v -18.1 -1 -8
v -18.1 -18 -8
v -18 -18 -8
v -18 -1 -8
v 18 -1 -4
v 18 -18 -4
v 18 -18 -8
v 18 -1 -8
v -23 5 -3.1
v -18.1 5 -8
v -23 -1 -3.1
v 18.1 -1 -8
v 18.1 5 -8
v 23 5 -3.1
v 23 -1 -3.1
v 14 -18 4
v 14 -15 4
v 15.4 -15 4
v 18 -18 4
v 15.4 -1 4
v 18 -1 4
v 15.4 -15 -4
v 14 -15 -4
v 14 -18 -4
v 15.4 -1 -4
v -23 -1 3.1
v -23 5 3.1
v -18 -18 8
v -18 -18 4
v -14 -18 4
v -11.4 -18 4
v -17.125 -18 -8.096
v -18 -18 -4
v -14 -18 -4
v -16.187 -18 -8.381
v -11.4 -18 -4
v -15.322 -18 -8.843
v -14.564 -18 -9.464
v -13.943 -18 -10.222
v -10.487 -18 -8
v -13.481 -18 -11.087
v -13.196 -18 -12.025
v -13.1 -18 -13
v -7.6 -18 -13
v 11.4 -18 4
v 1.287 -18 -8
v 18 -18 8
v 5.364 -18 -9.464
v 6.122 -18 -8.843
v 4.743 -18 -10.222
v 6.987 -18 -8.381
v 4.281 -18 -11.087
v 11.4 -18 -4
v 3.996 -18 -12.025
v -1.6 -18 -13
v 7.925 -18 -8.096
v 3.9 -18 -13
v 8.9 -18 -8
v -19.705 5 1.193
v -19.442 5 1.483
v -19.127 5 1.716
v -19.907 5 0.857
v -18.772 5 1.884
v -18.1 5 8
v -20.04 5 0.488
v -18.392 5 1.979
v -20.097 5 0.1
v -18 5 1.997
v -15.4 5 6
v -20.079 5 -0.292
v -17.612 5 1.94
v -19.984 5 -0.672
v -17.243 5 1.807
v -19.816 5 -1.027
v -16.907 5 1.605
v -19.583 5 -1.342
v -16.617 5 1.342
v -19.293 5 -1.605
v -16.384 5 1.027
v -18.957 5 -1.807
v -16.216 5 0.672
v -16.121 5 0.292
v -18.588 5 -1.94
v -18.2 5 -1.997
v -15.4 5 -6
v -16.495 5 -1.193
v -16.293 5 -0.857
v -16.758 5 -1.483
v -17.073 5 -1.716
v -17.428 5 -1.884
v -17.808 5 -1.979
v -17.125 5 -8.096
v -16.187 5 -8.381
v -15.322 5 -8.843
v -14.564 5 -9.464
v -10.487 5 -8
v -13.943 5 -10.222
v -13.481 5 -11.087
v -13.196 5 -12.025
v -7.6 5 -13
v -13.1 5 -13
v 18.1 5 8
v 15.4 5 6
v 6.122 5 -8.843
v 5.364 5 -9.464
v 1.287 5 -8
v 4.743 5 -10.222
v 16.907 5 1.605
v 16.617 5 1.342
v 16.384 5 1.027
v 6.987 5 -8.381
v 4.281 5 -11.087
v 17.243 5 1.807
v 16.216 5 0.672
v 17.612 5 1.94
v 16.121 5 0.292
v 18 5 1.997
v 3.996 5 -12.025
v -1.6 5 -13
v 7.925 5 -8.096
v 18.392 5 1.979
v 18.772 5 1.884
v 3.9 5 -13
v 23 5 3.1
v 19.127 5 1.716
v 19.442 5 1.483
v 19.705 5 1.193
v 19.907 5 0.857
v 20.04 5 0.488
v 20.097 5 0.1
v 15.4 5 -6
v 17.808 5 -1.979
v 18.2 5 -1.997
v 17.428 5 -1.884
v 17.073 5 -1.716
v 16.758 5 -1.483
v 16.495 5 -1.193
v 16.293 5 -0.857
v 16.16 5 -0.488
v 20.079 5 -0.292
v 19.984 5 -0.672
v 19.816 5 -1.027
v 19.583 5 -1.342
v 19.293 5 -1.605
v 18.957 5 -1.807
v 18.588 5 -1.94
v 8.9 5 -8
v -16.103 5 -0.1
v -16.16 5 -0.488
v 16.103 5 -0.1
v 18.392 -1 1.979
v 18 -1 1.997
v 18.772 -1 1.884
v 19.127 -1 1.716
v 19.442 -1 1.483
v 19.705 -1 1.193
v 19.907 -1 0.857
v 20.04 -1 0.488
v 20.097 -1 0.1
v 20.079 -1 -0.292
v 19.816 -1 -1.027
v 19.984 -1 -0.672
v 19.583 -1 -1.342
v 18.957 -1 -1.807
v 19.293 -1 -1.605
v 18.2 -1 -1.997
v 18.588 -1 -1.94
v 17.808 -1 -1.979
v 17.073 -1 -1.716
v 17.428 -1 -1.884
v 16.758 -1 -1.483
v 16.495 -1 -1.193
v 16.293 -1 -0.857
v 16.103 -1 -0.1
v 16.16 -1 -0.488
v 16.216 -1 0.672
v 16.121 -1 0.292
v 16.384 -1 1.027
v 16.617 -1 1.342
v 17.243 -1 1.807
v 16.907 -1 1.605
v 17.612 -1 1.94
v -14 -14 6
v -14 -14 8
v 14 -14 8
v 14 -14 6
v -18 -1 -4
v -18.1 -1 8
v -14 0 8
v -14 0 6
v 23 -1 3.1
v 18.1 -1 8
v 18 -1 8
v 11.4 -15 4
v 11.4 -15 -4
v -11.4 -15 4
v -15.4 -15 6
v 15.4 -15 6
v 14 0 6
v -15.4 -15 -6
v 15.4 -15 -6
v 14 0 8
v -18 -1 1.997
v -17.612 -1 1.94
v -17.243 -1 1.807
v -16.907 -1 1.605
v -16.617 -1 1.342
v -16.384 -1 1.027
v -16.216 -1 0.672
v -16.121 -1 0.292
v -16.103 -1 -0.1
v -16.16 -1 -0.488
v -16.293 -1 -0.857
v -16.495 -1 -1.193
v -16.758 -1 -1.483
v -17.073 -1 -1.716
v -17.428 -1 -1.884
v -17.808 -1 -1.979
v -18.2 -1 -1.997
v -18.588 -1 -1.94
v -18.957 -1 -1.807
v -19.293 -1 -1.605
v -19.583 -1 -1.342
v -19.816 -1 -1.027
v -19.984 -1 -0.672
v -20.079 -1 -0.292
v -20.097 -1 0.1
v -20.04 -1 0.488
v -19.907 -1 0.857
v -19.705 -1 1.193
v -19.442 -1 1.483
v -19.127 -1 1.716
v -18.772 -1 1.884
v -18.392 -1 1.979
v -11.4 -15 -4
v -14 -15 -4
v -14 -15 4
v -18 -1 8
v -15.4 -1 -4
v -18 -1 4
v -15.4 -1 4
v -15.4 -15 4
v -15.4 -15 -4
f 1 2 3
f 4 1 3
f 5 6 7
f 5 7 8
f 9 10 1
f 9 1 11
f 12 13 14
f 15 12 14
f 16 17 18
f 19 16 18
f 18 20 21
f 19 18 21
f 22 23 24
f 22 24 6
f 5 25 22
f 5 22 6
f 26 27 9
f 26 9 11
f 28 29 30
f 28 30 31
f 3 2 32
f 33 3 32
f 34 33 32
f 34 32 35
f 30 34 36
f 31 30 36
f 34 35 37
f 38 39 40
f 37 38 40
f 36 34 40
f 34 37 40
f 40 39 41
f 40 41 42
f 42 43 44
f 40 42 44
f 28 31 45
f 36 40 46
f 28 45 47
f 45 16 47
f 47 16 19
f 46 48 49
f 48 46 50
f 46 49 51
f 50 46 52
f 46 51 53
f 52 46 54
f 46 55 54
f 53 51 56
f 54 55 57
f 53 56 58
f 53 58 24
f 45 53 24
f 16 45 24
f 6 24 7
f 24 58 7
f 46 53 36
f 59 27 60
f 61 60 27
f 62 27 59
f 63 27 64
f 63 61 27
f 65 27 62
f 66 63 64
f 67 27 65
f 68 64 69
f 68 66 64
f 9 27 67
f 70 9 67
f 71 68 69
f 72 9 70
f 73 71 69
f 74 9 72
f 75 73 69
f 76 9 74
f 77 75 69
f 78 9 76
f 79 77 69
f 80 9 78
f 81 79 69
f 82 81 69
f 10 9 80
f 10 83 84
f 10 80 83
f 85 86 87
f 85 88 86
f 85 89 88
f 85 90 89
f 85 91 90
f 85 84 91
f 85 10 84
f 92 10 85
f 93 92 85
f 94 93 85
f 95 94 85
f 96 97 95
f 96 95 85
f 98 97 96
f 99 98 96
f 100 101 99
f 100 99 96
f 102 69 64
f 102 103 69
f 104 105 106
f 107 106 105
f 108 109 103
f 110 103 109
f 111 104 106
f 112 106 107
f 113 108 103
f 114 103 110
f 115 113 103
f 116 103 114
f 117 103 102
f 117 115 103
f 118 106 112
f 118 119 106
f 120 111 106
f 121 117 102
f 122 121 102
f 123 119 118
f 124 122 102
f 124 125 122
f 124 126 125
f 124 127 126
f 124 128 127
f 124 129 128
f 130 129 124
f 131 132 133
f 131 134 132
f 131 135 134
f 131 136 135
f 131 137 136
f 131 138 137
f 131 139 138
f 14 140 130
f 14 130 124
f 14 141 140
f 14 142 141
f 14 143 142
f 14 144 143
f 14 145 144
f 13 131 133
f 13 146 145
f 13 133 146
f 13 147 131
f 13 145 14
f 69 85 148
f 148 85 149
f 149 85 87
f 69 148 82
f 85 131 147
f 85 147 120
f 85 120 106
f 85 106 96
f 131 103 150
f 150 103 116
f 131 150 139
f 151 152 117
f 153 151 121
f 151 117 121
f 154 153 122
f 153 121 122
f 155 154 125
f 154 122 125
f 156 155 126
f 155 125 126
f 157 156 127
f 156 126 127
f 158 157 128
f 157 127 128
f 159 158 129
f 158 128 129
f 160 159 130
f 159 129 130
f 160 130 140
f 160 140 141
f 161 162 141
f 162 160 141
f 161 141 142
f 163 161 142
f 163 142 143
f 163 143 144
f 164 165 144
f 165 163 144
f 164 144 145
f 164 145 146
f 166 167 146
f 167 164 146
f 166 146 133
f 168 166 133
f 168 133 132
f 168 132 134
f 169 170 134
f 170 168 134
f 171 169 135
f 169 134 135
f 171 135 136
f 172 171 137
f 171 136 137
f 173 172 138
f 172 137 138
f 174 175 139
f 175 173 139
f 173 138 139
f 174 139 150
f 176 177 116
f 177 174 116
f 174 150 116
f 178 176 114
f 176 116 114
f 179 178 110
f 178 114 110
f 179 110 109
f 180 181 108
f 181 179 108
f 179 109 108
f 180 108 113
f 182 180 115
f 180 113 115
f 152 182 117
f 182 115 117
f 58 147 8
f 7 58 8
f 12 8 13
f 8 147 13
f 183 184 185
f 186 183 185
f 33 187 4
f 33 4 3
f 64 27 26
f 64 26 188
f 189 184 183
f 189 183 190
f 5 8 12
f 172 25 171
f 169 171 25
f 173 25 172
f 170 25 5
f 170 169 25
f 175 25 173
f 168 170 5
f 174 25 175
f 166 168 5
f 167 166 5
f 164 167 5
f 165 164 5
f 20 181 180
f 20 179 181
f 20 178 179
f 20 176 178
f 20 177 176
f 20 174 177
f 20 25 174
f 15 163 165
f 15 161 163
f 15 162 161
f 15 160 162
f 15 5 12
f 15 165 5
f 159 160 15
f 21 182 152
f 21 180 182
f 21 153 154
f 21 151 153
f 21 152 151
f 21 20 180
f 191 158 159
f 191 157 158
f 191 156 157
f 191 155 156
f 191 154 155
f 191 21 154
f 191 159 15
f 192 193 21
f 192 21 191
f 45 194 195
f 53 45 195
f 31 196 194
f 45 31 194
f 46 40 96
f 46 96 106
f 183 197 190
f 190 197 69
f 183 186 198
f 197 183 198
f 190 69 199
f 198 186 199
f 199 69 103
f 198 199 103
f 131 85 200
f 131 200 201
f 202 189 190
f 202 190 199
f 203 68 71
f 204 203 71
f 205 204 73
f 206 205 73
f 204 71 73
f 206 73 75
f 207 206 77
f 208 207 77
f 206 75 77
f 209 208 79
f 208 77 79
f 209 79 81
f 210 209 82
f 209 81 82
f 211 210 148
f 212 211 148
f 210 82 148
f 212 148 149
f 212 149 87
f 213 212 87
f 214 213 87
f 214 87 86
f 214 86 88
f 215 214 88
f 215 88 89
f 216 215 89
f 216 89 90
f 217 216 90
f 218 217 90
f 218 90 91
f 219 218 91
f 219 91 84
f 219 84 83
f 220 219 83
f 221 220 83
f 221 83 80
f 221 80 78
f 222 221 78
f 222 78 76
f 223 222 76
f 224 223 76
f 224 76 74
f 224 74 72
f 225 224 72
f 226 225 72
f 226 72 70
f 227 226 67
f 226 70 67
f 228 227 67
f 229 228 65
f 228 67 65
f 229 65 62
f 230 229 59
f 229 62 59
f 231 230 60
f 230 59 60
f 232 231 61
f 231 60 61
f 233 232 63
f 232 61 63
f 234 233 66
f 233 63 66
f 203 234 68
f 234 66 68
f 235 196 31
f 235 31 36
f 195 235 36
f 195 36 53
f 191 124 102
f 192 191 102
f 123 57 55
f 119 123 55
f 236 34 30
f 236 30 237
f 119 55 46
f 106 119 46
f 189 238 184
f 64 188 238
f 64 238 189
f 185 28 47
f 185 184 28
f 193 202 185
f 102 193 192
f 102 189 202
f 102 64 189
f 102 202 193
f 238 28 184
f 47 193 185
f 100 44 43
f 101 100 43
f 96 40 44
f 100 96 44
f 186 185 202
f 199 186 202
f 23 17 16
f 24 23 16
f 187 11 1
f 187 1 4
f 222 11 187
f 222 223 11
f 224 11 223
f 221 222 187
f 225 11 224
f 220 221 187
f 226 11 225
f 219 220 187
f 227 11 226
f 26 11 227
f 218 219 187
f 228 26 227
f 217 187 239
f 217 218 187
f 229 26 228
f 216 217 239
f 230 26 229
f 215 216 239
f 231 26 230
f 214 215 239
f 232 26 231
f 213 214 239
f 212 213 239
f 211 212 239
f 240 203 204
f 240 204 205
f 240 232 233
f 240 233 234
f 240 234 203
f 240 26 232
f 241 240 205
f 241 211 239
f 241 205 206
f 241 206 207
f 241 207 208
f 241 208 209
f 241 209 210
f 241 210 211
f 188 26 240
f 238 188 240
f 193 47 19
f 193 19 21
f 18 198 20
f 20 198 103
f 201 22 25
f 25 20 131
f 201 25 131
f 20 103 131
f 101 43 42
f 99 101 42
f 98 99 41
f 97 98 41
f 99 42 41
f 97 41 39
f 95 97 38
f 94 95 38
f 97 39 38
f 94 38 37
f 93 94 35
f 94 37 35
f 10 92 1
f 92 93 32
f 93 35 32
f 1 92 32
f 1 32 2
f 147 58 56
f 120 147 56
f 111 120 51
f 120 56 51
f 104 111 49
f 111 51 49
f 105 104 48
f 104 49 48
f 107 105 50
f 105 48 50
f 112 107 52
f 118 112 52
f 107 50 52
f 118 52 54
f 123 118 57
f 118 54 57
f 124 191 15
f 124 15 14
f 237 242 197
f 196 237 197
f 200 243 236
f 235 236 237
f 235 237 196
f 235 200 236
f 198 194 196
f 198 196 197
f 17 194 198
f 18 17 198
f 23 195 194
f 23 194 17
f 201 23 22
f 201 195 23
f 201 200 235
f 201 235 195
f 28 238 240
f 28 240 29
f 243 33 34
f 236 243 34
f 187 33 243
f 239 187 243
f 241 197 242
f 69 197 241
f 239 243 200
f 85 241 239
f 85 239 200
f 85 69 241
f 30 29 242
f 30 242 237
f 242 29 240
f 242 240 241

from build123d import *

# Parameters (mm, degrees)
SKETCH1_W      = 30
SKETCH1_H      = 15
SKETCH1_H_2    = 5
EXTRUDE1_DEPTH = 8
EXTRUDE2_START = 5
SKETCH2_R      = 2
SKETCH2_W      = 30.8
SKETCH2_H      = 12
SKETCH2_W_2    = 22.8
SKETCH2_H_2    = 8
EXTRUDE2_DEPTH = 20
EXTRUDE3_START = 8
SKETCH3_W      = 28
SKETCH3_H      = 14
EXTRUDE3_DEPTH = 14
EXTRUDE4_DEPTH = 4
EXTRUDE5_START = -15
SKETCH2_3_W    = 22.8
SKETCH2_3_H    = 8
EXTRUDE5_DEPTH = 3
EXTRUDE6_START = -18
EXTRUDE6_DEPTH = 23


with BuildPart() as part:
    # Sketch1 → Extrude1 (new, symmetric)
    with BuildSketch(Plane.XY):
        Polygon((-15, 0), (-15, 5), (-23, 5), (-23, -1), (-18, -1), (-18, -18), (18, -18), (18, -1), (23, -1), (23, 5), (15, 5), (15, 0), (15, -15), (-15, -15), align=None)
        with Locations((0, -7.5)):
            Rectangle(SKETCH1_W, SKETCH1_H)
        with Locations((0, 2.5)):
            Rectangle(SKETCH1_W, SKETCH1_H_2)
    extrude(amount=EXTRUDE1_DEPTH, both=True)

    # Sketch2 → Extrude2 (cut)
    with BuildSketch(Plane(origin=(0, 0, 0), x_dir=(1, 0, 0), z_dir=(0, 1, 0)).offset(EXTRUDE2_START)):
        Polygon((-23, -8), (-23, -3.1), (-18.1, -8), align=None)
        with Locations(Location((-18.1, 0, 0), (0, 0, 272.865983983))):
            Circle(SKETCH2_R)
        Polygon((-23, 8), (-18.1, 8), (-23, 3.1), align=None)
        Rectangle(SKETCH2_W, SKETCH2_H)
        Rectangle(SKETCH2_W_2, SKETCH2_H_2, mode=Mode.SUBTRACT)
        Rectangle(SKETCH2_W_2, SKETCH2_H_2)
        Polygon((23, 3.1), (23, 8), (18.1, 8), align=None)
        with Locations(Location((18.1, 0, 0), (0, 0, 267.134016017))):
            Circle(SKETCH2_R)
        Polygon((18.1, -8), (23, -8), (23, -3.1), align=None)
    extrude(amount=-EXTRUDE2_DEPTH, mode=Mode.SUBTRACT)

    # Sketch3 → Extrude3 (cut)
    with BuildSketch(Plane.XY.offset(EXTRUDE3_START)):
        with Locations((0, -7)):
            Rectangle(SKETCH3_W, SKETCH3_H)
    extrude(amount=-EXTRUDE3_DEPTH, mode=Mode.SUBTRACT)

    # Sketch3<3> → Extrude4 (cut, symmetric)
    with BuildSketch(Plane.XY):
        Polygon((-14, -18), (-14, -14), (-14, -1), (-18, -1), (-18, -18), align=None)
        Polygon((14, -1), (14, -14), (14, -18), (18, -18), (18, -1), align=None)
    extrude(amount=EXTRUDE4_DEPTH, both=True, mode=Mode.SUBTRACT)

    # Sketch2<3> → Extrude5 (cut)
    with BuildSketch(Plane(origin=(0, 0, 0), x_dir=(1, 0, 0), z_dir=(0, 1, 0)).offset(EXTRUDE5_START)):
        Rectangle(SKETCH2_3_W, SKETCH2_3_H)
    extrude(amount=-EXTRUDE5_DEPTH, mode=Mode.SUBTRACT)

    # Sketch4 → Extrude6 (add)
    with BuildSketch(Plane(origin=(0, 0, 0), x_dir=(1, 0, 0), z_dir=(0, 1, 0)).offset(EXTRUDE6_START)):
        with BuildLine():
            Line((-18.1, 8), (-13.1, 8))
            Line((-13.1, 8), (-13.1, 13))
            ThreePointArc((-13.1, 13), (-14.564466094, 9.464466094), (-18.1, 8))
        make_face()
        Polygon((-13.1, 13), (-13.1, 8), (-10.486751346, 8), (-7.6, 13), align=None)
        Polygon((1.286751346, 8), (3.9, 8), (3.9, 13), (-1.6, 13), align=None)
        with BuildLine():
            Line((3.9, 13), (3.9, 8))
            Line((3.9, 8), (8.9, 8))
            ThreePointArc((8.9, 8), (5.364466094, 9.464466094), (3.9, 13))
        make_face()
    extrude(amount=EXTRUDE6_DEPTH)


solid = part.part
